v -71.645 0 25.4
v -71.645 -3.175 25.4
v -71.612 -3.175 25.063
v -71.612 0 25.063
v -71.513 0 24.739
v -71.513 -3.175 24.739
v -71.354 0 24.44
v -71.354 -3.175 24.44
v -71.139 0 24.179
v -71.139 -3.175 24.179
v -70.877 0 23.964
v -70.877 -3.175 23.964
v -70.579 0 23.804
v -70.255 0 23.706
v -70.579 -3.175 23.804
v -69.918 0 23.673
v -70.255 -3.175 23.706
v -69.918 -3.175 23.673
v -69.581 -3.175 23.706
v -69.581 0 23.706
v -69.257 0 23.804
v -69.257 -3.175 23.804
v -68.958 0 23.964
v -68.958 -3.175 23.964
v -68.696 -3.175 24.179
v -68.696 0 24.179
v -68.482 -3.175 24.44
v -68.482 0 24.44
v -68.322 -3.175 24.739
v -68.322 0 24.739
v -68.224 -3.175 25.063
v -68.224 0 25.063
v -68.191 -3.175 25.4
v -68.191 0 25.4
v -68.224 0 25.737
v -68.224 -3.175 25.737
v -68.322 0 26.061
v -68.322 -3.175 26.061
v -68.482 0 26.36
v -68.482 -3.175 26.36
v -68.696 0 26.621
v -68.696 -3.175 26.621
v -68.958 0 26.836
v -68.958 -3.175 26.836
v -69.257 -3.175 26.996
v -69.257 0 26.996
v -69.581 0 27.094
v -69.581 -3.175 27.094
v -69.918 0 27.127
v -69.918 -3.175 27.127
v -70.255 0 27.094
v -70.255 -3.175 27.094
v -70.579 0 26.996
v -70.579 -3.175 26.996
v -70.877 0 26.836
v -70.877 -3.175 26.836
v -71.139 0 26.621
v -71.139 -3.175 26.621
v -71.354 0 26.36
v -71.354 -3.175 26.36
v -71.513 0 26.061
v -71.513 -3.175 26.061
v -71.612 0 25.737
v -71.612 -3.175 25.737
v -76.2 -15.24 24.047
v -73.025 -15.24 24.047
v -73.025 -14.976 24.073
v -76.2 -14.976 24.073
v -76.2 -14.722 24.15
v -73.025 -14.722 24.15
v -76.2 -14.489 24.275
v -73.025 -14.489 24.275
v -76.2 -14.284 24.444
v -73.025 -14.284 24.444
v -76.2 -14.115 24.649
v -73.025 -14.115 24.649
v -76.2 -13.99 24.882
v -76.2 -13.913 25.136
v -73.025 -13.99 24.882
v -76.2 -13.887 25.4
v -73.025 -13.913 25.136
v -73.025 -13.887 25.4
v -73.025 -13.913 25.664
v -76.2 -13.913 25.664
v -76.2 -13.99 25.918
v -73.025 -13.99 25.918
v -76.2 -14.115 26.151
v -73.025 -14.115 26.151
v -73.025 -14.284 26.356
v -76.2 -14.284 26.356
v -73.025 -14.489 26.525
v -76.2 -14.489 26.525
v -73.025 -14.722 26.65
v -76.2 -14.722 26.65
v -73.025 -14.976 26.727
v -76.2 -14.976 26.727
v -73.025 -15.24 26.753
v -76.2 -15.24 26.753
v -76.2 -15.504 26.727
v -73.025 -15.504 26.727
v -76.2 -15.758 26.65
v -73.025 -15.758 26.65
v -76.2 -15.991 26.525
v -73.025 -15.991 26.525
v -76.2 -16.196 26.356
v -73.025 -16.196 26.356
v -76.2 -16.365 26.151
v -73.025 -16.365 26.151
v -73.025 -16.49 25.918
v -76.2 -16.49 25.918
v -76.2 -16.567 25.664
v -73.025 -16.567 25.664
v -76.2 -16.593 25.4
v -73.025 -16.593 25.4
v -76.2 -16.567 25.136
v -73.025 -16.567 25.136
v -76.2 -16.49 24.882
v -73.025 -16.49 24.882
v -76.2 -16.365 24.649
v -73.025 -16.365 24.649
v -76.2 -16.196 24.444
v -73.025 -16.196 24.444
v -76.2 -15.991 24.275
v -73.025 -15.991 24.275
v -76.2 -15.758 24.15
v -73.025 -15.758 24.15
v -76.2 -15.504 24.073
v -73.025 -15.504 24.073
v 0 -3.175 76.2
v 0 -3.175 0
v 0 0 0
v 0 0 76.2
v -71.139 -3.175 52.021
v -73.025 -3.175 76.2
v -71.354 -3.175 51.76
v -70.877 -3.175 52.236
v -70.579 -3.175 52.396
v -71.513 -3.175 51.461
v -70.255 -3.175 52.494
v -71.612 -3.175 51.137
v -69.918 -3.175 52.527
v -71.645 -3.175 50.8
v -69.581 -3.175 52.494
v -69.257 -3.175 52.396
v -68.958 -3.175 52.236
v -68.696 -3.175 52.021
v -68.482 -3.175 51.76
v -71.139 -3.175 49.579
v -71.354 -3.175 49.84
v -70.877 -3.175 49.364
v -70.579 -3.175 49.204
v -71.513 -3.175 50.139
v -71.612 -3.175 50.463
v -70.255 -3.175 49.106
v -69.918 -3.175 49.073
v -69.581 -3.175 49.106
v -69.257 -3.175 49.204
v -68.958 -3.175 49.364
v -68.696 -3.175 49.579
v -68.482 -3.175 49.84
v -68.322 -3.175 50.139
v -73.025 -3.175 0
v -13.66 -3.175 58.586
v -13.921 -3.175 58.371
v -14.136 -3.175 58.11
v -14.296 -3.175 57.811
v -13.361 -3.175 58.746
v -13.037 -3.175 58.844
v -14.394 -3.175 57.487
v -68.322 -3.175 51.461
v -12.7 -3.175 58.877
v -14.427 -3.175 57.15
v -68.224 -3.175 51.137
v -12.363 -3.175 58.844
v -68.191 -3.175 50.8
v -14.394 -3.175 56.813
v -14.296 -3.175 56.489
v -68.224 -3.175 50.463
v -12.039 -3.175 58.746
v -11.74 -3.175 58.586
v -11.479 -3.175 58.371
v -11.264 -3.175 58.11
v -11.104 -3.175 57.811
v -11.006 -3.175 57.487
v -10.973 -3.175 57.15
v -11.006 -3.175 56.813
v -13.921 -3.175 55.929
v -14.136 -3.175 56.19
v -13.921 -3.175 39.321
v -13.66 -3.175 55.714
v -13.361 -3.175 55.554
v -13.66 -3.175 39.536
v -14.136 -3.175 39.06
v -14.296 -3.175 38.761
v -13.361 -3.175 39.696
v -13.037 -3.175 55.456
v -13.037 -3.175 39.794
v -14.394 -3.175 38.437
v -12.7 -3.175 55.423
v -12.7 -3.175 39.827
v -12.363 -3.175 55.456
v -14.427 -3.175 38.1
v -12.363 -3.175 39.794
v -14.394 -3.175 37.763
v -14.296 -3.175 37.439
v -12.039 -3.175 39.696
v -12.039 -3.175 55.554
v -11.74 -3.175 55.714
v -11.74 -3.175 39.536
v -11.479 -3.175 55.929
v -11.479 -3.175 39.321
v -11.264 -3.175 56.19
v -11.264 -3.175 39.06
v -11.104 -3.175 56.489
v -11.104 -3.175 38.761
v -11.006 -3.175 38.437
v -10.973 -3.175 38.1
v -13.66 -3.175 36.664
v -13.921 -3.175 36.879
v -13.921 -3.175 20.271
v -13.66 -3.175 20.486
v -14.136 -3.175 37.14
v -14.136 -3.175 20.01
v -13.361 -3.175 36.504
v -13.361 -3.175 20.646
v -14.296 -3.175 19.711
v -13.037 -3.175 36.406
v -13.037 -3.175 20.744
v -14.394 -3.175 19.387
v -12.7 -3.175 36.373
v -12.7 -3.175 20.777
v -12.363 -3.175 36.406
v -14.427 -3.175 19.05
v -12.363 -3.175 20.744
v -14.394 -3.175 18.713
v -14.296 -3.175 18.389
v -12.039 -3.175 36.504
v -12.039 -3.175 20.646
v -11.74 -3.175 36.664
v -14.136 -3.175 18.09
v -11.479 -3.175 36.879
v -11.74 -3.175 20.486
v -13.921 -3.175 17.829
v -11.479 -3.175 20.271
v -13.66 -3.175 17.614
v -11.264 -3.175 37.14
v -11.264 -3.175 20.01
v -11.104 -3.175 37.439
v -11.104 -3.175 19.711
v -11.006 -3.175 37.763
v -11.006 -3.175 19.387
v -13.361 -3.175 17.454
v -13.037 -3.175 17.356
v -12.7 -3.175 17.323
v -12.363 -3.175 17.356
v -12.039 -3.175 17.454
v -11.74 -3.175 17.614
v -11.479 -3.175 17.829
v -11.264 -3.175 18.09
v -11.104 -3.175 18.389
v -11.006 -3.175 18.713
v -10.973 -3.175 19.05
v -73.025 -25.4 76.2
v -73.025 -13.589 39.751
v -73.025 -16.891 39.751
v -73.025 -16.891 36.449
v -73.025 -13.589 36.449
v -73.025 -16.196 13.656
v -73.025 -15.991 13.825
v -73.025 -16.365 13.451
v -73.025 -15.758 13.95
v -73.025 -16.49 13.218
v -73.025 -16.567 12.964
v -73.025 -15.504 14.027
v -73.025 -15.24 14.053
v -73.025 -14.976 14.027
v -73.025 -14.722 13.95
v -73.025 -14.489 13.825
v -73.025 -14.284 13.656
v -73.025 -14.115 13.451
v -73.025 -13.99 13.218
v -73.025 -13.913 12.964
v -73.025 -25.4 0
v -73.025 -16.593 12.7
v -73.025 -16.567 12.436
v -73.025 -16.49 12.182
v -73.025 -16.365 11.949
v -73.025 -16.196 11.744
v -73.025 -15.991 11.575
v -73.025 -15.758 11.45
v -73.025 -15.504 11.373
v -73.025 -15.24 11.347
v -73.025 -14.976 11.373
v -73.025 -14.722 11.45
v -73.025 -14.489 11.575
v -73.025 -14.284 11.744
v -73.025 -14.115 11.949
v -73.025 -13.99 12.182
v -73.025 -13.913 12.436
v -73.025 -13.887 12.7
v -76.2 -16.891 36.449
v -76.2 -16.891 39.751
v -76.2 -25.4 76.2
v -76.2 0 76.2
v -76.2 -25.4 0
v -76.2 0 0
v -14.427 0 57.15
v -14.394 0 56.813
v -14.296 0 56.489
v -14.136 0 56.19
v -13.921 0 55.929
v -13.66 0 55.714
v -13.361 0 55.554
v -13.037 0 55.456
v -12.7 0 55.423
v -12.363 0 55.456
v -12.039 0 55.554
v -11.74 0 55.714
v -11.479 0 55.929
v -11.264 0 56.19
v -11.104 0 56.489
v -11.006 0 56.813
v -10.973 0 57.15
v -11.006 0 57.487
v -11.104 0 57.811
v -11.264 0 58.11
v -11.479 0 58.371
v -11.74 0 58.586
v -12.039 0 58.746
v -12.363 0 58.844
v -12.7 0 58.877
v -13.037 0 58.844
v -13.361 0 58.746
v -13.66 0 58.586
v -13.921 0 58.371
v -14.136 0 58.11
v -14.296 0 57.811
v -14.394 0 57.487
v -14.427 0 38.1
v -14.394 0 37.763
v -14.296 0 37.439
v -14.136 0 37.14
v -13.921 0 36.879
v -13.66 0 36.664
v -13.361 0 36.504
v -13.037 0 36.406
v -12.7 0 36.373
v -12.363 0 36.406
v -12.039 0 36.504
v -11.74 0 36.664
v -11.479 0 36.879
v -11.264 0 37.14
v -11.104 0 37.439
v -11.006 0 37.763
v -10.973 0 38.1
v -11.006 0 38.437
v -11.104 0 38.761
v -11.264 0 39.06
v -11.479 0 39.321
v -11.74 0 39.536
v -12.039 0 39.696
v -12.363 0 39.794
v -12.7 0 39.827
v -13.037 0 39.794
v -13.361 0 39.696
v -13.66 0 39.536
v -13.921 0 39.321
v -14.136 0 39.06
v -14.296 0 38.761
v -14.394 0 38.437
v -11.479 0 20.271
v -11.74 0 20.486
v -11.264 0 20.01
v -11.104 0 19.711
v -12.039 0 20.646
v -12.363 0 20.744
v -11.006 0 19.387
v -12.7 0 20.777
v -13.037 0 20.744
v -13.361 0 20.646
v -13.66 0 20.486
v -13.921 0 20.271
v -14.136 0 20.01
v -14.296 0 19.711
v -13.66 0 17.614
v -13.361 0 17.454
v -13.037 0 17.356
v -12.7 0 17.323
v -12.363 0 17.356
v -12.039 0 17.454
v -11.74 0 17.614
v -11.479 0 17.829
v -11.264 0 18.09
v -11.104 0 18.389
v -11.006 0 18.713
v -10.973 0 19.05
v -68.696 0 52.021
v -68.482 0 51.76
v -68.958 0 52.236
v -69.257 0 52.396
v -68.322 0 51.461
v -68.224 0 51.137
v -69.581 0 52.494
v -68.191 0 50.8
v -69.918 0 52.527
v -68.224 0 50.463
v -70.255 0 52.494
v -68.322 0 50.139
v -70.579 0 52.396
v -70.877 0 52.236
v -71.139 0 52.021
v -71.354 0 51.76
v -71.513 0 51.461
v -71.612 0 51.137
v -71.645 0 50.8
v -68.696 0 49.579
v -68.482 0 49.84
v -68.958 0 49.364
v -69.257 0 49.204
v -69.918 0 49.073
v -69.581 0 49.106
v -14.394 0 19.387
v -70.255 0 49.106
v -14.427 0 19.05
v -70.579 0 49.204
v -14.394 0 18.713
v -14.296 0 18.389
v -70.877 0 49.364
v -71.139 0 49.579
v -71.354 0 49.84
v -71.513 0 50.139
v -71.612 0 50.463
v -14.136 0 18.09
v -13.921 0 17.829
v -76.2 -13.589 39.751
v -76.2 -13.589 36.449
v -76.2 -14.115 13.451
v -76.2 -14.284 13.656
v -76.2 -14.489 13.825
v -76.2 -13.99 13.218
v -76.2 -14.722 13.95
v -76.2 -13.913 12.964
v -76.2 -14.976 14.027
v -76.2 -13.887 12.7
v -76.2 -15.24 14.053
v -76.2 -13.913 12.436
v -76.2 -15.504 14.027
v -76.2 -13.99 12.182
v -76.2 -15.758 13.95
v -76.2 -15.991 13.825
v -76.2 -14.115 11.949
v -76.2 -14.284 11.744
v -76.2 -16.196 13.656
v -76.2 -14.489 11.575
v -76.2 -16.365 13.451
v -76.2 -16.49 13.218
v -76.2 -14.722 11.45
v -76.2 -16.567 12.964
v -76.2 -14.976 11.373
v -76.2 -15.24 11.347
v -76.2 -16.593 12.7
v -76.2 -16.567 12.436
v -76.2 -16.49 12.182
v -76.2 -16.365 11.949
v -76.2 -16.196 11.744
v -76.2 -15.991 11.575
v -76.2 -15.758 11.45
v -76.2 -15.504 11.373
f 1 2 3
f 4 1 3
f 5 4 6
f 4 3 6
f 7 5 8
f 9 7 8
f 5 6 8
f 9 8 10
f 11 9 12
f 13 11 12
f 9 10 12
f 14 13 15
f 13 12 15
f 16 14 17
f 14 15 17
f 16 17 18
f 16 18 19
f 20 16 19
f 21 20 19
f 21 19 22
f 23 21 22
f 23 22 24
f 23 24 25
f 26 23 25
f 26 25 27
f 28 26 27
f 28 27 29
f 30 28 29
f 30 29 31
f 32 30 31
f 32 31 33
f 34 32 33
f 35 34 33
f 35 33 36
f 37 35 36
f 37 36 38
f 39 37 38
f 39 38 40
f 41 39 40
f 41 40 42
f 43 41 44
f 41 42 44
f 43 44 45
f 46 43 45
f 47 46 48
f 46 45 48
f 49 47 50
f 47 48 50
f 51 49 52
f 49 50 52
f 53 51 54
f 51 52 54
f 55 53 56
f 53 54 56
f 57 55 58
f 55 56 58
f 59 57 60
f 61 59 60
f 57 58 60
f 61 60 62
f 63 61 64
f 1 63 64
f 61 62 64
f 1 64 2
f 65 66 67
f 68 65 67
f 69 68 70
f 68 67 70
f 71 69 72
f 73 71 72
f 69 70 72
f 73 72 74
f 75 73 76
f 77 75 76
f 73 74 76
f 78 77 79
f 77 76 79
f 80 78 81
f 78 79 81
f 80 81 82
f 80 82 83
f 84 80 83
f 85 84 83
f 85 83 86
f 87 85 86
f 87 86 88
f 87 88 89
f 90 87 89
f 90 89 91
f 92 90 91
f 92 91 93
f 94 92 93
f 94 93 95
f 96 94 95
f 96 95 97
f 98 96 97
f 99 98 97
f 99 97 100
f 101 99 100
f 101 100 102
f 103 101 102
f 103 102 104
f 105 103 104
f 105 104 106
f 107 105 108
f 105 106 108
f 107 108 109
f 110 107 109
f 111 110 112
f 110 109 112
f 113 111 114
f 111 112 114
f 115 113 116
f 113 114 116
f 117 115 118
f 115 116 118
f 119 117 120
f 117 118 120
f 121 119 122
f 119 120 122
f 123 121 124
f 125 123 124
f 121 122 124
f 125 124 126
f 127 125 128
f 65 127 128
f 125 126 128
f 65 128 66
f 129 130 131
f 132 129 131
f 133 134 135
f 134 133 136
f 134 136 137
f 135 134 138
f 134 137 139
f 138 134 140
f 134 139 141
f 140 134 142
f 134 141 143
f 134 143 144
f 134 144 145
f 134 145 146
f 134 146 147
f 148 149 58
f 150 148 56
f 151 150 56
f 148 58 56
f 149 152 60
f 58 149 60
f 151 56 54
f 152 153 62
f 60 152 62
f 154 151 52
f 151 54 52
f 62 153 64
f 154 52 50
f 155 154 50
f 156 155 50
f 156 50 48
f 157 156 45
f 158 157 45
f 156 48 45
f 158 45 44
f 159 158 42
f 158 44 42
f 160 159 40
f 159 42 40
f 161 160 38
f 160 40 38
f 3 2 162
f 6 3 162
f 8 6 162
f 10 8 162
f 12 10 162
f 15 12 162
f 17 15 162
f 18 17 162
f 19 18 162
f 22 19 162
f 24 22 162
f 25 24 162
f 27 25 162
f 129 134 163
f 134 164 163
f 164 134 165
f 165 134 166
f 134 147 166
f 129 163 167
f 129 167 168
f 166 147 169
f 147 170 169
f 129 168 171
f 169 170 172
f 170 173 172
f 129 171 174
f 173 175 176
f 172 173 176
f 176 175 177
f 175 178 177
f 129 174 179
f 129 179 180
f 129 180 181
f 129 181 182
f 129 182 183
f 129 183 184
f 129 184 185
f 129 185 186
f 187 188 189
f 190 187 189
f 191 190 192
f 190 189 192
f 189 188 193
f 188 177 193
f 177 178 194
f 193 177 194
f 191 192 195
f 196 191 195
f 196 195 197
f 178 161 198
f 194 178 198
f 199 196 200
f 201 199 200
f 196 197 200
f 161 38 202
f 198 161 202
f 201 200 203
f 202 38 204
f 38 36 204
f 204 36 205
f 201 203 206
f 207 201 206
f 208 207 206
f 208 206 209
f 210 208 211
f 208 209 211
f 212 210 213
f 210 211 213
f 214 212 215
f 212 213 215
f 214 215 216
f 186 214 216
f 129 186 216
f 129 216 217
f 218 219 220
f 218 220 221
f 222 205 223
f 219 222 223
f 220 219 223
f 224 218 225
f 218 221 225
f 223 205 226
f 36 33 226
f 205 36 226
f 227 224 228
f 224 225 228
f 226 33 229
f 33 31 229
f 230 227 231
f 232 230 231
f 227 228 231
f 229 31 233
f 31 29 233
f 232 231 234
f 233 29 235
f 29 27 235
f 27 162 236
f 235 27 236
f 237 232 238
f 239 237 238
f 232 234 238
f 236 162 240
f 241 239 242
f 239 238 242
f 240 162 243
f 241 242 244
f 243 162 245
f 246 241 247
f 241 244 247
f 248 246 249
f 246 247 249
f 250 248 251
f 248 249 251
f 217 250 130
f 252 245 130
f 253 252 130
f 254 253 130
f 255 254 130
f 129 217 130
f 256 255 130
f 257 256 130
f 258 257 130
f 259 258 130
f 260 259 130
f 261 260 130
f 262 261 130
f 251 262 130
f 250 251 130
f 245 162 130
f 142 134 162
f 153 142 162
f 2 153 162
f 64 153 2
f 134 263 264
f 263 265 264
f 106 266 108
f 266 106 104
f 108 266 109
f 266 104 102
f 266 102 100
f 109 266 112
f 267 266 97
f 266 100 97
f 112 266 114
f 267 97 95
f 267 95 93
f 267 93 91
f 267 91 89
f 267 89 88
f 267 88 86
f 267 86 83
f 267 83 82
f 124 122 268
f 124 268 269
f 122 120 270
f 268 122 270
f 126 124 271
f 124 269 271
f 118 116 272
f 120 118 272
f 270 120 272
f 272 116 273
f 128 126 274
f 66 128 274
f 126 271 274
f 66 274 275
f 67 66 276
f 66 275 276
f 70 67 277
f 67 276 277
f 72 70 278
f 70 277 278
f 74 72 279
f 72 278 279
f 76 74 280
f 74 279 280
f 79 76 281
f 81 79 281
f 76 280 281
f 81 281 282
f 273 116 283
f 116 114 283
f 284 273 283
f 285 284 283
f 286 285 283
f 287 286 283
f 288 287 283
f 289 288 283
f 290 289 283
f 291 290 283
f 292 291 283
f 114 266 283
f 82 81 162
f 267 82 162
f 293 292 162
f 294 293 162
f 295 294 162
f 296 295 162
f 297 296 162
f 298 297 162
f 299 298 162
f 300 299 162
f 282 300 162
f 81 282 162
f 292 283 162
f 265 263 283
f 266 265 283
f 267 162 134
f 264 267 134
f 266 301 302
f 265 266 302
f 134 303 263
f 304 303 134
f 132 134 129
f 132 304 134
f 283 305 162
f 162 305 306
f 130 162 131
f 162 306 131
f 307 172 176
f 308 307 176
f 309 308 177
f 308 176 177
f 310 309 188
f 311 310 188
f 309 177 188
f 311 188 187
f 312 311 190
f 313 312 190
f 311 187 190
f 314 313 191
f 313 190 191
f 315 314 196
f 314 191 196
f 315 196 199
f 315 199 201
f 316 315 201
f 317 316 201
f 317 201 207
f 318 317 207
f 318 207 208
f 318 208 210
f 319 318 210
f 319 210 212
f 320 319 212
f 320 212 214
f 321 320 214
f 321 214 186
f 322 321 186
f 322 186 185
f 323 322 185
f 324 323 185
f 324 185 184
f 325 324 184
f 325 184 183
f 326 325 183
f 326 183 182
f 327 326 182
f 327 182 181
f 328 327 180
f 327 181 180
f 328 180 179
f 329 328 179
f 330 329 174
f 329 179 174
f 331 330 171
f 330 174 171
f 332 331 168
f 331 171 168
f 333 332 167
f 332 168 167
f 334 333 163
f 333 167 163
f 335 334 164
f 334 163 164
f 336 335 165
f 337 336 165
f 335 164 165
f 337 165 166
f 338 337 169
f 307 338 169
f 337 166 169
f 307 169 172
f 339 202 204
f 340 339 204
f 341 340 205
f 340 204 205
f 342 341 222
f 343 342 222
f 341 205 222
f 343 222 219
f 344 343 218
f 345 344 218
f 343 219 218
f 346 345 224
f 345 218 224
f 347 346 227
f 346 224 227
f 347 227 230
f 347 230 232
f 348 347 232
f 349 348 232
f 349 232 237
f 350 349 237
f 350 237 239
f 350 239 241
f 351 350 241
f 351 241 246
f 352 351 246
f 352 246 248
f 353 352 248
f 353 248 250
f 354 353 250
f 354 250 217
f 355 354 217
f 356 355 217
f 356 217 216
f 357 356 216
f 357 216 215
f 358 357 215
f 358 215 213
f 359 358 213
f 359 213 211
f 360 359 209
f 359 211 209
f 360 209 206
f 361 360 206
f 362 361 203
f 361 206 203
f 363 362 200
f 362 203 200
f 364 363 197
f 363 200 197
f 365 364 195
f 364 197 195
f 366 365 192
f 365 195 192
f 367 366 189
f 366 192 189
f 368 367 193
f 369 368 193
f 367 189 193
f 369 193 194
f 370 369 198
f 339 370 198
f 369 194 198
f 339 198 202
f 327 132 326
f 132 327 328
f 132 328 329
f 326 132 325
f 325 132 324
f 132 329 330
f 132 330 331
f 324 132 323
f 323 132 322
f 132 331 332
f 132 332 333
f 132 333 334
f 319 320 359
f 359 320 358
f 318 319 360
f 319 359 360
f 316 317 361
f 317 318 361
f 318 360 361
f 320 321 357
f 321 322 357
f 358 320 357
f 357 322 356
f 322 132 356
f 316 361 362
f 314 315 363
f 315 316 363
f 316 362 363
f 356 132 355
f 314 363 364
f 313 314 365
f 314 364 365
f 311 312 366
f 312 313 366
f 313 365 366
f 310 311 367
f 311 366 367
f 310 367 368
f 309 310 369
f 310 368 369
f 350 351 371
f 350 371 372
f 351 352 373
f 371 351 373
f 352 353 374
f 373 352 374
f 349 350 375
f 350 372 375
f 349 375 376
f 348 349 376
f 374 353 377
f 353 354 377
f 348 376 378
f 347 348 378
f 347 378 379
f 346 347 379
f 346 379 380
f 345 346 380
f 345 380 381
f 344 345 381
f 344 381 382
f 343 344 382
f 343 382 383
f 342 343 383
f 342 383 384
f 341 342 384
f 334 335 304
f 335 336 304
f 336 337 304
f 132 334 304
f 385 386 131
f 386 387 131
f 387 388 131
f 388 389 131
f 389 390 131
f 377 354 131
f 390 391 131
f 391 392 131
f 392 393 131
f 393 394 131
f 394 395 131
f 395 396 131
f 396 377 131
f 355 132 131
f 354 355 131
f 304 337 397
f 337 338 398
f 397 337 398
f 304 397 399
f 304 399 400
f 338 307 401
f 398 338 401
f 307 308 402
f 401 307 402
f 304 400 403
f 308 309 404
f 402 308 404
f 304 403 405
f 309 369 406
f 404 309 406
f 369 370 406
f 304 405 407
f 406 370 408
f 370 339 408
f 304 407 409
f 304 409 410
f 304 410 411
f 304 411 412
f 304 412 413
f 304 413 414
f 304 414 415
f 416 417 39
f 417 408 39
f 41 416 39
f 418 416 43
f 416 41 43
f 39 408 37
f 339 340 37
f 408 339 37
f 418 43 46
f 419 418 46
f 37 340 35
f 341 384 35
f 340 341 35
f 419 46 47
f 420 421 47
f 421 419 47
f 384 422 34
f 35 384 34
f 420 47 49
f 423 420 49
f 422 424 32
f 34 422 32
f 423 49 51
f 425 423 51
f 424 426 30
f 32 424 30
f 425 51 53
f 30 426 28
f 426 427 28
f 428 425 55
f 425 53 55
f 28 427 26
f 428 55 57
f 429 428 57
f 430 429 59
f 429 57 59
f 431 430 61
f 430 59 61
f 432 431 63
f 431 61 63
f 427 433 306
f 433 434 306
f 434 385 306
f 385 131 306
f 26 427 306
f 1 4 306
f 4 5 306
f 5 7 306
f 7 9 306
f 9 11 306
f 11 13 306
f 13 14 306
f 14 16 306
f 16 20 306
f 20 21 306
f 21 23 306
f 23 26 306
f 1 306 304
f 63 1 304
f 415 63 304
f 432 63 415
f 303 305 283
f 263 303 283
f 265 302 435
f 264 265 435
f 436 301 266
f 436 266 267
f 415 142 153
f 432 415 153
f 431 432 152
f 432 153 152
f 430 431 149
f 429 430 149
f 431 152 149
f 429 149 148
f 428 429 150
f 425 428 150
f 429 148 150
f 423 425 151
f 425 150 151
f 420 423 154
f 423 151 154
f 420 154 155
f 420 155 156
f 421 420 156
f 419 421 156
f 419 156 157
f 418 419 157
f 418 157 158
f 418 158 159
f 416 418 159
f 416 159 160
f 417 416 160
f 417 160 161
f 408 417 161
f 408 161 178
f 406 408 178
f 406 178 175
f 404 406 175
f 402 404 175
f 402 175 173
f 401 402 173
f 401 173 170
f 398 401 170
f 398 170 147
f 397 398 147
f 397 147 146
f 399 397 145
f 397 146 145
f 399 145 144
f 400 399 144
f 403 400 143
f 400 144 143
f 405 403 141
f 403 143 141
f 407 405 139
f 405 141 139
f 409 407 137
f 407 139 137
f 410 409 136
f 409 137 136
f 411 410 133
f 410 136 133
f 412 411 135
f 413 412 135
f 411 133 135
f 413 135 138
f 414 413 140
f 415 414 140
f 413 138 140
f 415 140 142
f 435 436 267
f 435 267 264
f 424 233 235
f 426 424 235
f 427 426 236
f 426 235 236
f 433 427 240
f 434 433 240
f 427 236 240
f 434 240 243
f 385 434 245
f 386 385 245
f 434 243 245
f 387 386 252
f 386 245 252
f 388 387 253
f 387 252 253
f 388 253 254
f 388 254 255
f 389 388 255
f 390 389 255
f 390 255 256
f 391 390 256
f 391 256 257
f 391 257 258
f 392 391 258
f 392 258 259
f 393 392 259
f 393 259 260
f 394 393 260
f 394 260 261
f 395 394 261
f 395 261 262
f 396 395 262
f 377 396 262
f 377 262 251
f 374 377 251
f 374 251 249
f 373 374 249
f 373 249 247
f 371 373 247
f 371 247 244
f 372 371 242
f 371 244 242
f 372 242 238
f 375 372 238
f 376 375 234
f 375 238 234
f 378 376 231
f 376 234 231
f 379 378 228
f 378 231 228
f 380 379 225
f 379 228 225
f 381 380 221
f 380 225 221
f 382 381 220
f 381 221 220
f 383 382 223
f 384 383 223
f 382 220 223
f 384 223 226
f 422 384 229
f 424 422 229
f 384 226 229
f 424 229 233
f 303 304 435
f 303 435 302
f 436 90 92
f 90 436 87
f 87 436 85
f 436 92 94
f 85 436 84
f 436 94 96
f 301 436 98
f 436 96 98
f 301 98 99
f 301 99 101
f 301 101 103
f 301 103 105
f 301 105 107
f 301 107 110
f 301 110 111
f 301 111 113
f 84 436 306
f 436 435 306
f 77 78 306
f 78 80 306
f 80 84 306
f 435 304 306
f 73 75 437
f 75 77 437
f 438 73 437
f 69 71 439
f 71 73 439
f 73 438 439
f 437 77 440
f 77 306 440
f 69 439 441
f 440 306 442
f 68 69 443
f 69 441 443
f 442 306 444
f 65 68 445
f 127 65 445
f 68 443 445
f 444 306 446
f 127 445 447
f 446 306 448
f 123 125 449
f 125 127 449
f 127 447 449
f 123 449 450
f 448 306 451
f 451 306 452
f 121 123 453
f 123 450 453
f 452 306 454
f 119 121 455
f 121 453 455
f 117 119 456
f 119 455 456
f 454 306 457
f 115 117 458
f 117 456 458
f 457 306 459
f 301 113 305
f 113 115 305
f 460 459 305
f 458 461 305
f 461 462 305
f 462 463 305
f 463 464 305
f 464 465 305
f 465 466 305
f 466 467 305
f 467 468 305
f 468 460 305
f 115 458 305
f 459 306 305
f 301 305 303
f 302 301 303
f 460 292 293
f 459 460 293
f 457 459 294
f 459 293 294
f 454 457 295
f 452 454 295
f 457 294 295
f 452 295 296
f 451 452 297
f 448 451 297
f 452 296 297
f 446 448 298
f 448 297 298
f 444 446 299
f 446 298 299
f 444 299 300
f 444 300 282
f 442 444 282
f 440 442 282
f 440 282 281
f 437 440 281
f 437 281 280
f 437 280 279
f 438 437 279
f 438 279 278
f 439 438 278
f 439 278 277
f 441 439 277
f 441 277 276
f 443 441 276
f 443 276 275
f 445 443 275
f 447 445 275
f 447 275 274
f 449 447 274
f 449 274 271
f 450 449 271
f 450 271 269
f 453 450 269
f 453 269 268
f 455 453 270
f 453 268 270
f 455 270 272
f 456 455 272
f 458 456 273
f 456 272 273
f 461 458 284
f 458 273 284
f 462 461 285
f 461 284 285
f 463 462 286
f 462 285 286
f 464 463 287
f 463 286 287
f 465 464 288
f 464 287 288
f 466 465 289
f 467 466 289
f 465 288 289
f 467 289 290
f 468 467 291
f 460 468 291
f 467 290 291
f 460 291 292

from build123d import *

# Parameters (mm, degrees)
BOSS_EXTRUDE1_DEPTH       = 76.2
TAP_DRILL_FOR_6_32_TAP1_D = 2.7051
TAP_DRILL_FOR_8_32_TAP1_D = 3.4544
CUT_EXTRUDE1_REACH        = 112.716
SKETCH8_W                 = 3.302
SKETCH8_H                 = 3.302
TAP_DRILL_FOR_8_32_TAP2_D = 3.4544


with BuildPart() as part:
    # Sketch2 → Boss-Extrude1 (new body)
    with BuildSketch(Plane.XY):
        Polygon((0, 0), (-76.2, 0), (-76.2, -25.4), (-73.025, -25.4), (-73.025, -3.175), (0, -3.175), align=None)
    extrude(amount=BOSS_EXTRUDE1_DEPTH)

    # Tap Drill for #6-32 Tap1 (through all)
    with Locations(Plane.ZY.offset(76.2)):
        with Locations((25.4, -15.24), (12.7, -15.24)):
            Hole(TAP_DRILL_FOR_6_32_TAP1_D / 2)

    # Tap Drill for #8-32 Tap1 (through all)
    with Locations(Plane(origin=(0, 0, 0), x_dir=(1, 0, 0), z_dir=(0, 1, 0))):
        with Locations((-69.917738612, -25.4), (-69.917738612, -50.8)):
            Hole(TAP_DRILL_FOR_8_32_TAP1_D / 2)

    # Sketch8 → Cut-Extrude1 (cut, up to next)
    with BuildSketch(Plane.ZY.offset(76.2), mode=Mode.PRIVATE) as cut_extrude1_sk1:
        with Locations((38.1, -15.24)):
            Rectangle(SKETCH8_W, SKETCH8_H)
    cut_extrude1_tool1 = extrude(cut_extrude1_sk1.sketch, amount=-CUT_EXTRUDE1_REACH, mode=Mode.PRIVATE) & part.part
    add(cut_extrude1_tool1.solids().sort_by_distance((-76.2, -15.24, 38.1))[0], mode=Mode.SUBTRACT)

    # Tap Drill for #8-32 Tap2 (through all)
    with Locations(Plane(origin=(0, 0, 0), x_dir=(1, 0, 0), z_dir=(0, 1, 0))):
        with Locations((-12.7, -19.05), (-12.7, -38.1), (-12.7, -57.15)):
            Hole(TAP_DRILL_FOR_8_32_TAP2_D / 2)


solid = part.part
